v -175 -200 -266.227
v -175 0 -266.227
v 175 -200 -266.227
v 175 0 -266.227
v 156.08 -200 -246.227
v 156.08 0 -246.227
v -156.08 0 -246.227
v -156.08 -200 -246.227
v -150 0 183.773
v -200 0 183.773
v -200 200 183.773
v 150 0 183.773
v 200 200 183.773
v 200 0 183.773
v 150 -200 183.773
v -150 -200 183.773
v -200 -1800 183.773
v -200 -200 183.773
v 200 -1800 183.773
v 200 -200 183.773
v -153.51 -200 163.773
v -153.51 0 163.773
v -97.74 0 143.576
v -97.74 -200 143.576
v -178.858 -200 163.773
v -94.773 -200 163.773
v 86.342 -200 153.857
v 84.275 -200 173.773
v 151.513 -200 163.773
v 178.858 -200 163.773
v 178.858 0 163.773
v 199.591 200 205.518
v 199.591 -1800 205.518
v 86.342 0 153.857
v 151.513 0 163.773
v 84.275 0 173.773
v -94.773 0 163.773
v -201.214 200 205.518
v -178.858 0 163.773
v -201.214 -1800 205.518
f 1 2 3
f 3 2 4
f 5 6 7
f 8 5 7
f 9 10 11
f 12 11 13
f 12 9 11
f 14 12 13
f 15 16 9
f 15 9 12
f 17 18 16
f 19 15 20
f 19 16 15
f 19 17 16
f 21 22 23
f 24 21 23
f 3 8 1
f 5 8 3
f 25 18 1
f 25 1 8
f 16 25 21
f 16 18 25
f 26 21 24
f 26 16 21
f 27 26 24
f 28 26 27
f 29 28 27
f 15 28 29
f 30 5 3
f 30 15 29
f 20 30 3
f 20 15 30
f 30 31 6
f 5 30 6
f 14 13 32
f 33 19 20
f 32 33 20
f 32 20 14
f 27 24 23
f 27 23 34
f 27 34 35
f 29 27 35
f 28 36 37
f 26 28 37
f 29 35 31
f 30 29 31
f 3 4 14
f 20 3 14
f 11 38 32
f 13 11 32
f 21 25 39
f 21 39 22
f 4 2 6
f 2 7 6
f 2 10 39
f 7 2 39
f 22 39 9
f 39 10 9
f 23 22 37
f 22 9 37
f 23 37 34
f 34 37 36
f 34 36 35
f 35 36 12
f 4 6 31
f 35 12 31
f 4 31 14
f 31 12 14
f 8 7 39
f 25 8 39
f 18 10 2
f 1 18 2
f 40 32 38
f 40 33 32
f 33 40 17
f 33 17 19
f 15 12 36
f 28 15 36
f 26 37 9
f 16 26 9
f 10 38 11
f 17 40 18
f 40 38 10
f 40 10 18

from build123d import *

# Parameters (mm, degrees)
F1_DEPTH = 200
F2_DEPTH = 1800
F3_DEPTH = 200


with BuildPart() as f1:
    # F0 (on Front) → F1 (new body)
    with BuildSketch(Plane.XZ):
        Polygon((-150, 183.772751), (-200, 183.772751), (-175, -266.227249), (175, -266.227249), (200, 183.772751), (150, 183.772751), (84.275194, 173.772751), (-94.773179, 163.772751), align=None)
        Polygon((-156.080271, -246.227249), (-178.858048, 163.772751), (-153.509895, 163.772751), (-97.739527, 143.575909), (86.341696, 153.856998), (151.512791, 163.772751), (178.858048, 163.772751), (156.080271, -246.227249), align=None, mode=Mode.SUBTRACT)
    extrude(amount=F1_DEPTH)

    # F0 (on Front) → F2 (join)
    with BuildSketch(Plane.XZ):
        Polygon((-201.214484, 205.517881), (-200, 183.772751), (-150, 183.772751), (150, 183.772751), (200, 183.772751), (199.590698, 205.517881), align=None)
    extrude(amount=F2_DEPTH)

    # F0 (on Front) → F3 (join)
    with BuildSketch(Plane.XZ):
        Polygon((-201.214484, 205.517881), (-200, 183.772751), (-150, 183.772751), (150, 183.772751), (200, 183.772751), (199.590698, 205.517881), align=None)
    extrude(amount=-F3_DEPTH)


solid = f1.part
